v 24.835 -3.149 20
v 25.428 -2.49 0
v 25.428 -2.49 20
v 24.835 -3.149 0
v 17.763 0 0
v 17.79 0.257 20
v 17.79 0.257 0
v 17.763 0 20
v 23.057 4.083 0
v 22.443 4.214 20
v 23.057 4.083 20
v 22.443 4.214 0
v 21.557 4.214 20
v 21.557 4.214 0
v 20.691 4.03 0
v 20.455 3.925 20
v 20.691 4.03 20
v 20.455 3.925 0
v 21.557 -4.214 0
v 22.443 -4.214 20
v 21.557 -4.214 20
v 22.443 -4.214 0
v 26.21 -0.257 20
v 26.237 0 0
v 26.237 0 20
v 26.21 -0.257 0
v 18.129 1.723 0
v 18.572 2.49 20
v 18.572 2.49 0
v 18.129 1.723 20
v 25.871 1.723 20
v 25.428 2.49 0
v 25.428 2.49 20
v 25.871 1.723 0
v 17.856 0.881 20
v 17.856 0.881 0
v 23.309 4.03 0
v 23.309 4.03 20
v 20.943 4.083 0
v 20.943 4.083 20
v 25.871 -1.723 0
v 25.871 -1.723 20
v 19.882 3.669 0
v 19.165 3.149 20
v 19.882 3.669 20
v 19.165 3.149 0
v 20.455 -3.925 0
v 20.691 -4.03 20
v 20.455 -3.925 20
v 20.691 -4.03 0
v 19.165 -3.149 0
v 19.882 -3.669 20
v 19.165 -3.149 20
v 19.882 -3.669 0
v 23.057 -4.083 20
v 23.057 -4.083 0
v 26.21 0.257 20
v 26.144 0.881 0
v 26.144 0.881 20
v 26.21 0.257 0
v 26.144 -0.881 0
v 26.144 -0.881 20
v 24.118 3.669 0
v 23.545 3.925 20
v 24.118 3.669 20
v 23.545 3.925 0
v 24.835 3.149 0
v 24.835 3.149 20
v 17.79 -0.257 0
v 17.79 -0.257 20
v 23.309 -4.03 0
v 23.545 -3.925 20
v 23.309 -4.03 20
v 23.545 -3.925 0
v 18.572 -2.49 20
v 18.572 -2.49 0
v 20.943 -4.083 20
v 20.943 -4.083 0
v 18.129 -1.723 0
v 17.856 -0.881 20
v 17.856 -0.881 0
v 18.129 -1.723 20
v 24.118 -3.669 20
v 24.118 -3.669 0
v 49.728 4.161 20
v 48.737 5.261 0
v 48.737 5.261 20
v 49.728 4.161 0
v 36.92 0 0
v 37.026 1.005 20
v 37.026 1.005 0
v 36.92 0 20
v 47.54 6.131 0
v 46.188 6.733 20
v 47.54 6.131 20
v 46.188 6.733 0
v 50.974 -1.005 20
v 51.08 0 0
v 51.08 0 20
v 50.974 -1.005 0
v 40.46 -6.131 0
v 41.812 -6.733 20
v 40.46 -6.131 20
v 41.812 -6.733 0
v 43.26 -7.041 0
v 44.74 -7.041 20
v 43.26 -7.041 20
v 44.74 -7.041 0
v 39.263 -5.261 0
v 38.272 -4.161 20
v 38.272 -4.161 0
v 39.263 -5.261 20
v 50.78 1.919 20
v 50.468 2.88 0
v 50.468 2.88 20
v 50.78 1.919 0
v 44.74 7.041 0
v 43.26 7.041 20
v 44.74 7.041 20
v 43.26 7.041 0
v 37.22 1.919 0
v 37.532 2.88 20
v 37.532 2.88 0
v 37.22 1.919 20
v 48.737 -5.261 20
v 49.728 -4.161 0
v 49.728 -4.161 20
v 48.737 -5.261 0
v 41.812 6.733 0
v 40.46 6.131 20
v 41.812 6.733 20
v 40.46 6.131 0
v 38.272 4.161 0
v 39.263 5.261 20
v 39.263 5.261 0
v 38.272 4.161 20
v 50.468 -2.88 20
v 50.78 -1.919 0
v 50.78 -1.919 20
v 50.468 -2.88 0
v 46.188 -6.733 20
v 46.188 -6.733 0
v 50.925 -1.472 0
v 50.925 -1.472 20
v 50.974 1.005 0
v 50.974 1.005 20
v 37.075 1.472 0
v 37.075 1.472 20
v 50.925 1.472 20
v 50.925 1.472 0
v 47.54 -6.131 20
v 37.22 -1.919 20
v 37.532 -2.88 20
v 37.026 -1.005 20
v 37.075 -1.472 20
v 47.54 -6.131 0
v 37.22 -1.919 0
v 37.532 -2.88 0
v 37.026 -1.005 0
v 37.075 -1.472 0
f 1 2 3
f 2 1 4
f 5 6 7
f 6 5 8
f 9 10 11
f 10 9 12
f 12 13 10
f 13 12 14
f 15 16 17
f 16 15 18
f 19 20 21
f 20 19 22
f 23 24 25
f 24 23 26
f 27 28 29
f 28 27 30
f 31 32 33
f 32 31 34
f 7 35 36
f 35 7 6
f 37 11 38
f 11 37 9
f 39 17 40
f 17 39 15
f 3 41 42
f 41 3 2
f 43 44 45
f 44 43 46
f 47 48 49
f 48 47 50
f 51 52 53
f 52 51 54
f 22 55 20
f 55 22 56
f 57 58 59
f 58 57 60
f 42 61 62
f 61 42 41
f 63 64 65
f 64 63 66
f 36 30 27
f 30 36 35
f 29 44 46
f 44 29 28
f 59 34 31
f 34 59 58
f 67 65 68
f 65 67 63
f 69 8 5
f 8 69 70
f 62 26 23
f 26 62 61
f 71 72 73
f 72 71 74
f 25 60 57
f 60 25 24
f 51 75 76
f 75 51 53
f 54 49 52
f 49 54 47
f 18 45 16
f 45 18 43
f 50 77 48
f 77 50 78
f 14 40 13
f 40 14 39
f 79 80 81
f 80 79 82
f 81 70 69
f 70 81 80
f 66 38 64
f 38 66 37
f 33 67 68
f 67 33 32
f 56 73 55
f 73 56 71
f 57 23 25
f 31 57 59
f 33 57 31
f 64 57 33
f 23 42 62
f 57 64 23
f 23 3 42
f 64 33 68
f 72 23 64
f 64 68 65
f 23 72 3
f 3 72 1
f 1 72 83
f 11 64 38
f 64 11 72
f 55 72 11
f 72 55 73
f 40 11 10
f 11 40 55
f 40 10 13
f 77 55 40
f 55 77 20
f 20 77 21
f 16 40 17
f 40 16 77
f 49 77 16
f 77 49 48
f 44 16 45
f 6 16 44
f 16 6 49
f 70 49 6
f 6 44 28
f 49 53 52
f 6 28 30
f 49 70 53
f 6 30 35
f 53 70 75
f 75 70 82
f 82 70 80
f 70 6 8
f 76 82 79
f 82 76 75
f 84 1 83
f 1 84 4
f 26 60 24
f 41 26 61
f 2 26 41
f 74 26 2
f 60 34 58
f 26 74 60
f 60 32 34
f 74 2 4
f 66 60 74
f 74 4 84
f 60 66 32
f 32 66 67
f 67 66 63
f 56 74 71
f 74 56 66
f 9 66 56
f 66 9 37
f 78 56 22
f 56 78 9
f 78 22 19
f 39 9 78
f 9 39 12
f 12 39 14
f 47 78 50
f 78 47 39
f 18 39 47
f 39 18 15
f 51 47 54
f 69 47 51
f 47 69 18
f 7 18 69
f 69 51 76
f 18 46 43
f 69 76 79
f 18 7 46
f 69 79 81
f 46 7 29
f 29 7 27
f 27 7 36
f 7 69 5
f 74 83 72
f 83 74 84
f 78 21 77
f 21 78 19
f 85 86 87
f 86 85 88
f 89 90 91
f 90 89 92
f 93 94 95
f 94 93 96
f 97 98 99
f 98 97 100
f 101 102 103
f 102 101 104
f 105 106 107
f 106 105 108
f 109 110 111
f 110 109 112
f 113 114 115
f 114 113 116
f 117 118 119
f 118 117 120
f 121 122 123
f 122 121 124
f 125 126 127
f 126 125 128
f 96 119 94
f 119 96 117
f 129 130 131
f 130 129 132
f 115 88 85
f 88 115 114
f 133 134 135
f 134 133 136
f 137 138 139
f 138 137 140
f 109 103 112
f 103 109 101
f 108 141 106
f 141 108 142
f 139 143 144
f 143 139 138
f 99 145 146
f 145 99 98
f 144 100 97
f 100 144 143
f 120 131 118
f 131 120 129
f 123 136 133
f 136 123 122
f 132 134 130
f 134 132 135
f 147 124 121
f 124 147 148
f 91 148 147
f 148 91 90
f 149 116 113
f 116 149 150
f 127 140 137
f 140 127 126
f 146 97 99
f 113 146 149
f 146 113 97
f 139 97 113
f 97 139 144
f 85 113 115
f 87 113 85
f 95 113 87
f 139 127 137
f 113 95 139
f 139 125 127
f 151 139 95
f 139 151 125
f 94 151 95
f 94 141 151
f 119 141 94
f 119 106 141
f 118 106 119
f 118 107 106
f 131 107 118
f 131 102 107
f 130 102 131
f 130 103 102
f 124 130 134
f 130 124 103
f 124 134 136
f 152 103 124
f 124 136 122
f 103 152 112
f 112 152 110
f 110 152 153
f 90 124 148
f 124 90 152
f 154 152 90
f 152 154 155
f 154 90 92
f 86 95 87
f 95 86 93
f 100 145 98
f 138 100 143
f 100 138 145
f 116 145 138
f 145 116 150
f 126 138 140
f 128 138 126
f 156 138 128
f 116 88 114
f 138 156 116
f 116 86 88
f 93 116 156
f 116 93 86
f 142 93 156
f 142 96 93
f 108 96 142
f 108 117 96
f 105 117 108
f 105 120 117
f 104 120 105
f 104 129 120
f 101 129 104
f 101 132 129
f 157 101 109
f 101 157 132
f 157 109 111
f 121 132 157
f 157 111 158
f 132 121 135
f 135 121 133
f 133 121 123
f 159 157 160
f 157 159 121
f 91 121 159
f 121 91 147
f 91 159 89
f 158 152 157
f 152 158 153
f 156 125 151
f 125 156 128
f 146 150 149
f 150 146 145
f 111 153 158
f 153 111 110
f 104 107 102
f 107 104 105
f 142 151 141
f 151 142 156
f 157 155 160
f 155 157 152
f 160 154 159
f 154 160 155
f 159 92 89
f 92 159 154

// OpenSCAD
// Volume: 4246.064336953236, SurfaceArea: 1844.1072792969264
// Linear extrude
translate([22,0,0]) linear_extrude(height=20) projection(cut=true) translate([0,0,9]) sphere(r=10);
translate([44,0,0]) linear_extrude(height=20) projection(cut=true) translate([0,0,7]) sphere(r=10);
